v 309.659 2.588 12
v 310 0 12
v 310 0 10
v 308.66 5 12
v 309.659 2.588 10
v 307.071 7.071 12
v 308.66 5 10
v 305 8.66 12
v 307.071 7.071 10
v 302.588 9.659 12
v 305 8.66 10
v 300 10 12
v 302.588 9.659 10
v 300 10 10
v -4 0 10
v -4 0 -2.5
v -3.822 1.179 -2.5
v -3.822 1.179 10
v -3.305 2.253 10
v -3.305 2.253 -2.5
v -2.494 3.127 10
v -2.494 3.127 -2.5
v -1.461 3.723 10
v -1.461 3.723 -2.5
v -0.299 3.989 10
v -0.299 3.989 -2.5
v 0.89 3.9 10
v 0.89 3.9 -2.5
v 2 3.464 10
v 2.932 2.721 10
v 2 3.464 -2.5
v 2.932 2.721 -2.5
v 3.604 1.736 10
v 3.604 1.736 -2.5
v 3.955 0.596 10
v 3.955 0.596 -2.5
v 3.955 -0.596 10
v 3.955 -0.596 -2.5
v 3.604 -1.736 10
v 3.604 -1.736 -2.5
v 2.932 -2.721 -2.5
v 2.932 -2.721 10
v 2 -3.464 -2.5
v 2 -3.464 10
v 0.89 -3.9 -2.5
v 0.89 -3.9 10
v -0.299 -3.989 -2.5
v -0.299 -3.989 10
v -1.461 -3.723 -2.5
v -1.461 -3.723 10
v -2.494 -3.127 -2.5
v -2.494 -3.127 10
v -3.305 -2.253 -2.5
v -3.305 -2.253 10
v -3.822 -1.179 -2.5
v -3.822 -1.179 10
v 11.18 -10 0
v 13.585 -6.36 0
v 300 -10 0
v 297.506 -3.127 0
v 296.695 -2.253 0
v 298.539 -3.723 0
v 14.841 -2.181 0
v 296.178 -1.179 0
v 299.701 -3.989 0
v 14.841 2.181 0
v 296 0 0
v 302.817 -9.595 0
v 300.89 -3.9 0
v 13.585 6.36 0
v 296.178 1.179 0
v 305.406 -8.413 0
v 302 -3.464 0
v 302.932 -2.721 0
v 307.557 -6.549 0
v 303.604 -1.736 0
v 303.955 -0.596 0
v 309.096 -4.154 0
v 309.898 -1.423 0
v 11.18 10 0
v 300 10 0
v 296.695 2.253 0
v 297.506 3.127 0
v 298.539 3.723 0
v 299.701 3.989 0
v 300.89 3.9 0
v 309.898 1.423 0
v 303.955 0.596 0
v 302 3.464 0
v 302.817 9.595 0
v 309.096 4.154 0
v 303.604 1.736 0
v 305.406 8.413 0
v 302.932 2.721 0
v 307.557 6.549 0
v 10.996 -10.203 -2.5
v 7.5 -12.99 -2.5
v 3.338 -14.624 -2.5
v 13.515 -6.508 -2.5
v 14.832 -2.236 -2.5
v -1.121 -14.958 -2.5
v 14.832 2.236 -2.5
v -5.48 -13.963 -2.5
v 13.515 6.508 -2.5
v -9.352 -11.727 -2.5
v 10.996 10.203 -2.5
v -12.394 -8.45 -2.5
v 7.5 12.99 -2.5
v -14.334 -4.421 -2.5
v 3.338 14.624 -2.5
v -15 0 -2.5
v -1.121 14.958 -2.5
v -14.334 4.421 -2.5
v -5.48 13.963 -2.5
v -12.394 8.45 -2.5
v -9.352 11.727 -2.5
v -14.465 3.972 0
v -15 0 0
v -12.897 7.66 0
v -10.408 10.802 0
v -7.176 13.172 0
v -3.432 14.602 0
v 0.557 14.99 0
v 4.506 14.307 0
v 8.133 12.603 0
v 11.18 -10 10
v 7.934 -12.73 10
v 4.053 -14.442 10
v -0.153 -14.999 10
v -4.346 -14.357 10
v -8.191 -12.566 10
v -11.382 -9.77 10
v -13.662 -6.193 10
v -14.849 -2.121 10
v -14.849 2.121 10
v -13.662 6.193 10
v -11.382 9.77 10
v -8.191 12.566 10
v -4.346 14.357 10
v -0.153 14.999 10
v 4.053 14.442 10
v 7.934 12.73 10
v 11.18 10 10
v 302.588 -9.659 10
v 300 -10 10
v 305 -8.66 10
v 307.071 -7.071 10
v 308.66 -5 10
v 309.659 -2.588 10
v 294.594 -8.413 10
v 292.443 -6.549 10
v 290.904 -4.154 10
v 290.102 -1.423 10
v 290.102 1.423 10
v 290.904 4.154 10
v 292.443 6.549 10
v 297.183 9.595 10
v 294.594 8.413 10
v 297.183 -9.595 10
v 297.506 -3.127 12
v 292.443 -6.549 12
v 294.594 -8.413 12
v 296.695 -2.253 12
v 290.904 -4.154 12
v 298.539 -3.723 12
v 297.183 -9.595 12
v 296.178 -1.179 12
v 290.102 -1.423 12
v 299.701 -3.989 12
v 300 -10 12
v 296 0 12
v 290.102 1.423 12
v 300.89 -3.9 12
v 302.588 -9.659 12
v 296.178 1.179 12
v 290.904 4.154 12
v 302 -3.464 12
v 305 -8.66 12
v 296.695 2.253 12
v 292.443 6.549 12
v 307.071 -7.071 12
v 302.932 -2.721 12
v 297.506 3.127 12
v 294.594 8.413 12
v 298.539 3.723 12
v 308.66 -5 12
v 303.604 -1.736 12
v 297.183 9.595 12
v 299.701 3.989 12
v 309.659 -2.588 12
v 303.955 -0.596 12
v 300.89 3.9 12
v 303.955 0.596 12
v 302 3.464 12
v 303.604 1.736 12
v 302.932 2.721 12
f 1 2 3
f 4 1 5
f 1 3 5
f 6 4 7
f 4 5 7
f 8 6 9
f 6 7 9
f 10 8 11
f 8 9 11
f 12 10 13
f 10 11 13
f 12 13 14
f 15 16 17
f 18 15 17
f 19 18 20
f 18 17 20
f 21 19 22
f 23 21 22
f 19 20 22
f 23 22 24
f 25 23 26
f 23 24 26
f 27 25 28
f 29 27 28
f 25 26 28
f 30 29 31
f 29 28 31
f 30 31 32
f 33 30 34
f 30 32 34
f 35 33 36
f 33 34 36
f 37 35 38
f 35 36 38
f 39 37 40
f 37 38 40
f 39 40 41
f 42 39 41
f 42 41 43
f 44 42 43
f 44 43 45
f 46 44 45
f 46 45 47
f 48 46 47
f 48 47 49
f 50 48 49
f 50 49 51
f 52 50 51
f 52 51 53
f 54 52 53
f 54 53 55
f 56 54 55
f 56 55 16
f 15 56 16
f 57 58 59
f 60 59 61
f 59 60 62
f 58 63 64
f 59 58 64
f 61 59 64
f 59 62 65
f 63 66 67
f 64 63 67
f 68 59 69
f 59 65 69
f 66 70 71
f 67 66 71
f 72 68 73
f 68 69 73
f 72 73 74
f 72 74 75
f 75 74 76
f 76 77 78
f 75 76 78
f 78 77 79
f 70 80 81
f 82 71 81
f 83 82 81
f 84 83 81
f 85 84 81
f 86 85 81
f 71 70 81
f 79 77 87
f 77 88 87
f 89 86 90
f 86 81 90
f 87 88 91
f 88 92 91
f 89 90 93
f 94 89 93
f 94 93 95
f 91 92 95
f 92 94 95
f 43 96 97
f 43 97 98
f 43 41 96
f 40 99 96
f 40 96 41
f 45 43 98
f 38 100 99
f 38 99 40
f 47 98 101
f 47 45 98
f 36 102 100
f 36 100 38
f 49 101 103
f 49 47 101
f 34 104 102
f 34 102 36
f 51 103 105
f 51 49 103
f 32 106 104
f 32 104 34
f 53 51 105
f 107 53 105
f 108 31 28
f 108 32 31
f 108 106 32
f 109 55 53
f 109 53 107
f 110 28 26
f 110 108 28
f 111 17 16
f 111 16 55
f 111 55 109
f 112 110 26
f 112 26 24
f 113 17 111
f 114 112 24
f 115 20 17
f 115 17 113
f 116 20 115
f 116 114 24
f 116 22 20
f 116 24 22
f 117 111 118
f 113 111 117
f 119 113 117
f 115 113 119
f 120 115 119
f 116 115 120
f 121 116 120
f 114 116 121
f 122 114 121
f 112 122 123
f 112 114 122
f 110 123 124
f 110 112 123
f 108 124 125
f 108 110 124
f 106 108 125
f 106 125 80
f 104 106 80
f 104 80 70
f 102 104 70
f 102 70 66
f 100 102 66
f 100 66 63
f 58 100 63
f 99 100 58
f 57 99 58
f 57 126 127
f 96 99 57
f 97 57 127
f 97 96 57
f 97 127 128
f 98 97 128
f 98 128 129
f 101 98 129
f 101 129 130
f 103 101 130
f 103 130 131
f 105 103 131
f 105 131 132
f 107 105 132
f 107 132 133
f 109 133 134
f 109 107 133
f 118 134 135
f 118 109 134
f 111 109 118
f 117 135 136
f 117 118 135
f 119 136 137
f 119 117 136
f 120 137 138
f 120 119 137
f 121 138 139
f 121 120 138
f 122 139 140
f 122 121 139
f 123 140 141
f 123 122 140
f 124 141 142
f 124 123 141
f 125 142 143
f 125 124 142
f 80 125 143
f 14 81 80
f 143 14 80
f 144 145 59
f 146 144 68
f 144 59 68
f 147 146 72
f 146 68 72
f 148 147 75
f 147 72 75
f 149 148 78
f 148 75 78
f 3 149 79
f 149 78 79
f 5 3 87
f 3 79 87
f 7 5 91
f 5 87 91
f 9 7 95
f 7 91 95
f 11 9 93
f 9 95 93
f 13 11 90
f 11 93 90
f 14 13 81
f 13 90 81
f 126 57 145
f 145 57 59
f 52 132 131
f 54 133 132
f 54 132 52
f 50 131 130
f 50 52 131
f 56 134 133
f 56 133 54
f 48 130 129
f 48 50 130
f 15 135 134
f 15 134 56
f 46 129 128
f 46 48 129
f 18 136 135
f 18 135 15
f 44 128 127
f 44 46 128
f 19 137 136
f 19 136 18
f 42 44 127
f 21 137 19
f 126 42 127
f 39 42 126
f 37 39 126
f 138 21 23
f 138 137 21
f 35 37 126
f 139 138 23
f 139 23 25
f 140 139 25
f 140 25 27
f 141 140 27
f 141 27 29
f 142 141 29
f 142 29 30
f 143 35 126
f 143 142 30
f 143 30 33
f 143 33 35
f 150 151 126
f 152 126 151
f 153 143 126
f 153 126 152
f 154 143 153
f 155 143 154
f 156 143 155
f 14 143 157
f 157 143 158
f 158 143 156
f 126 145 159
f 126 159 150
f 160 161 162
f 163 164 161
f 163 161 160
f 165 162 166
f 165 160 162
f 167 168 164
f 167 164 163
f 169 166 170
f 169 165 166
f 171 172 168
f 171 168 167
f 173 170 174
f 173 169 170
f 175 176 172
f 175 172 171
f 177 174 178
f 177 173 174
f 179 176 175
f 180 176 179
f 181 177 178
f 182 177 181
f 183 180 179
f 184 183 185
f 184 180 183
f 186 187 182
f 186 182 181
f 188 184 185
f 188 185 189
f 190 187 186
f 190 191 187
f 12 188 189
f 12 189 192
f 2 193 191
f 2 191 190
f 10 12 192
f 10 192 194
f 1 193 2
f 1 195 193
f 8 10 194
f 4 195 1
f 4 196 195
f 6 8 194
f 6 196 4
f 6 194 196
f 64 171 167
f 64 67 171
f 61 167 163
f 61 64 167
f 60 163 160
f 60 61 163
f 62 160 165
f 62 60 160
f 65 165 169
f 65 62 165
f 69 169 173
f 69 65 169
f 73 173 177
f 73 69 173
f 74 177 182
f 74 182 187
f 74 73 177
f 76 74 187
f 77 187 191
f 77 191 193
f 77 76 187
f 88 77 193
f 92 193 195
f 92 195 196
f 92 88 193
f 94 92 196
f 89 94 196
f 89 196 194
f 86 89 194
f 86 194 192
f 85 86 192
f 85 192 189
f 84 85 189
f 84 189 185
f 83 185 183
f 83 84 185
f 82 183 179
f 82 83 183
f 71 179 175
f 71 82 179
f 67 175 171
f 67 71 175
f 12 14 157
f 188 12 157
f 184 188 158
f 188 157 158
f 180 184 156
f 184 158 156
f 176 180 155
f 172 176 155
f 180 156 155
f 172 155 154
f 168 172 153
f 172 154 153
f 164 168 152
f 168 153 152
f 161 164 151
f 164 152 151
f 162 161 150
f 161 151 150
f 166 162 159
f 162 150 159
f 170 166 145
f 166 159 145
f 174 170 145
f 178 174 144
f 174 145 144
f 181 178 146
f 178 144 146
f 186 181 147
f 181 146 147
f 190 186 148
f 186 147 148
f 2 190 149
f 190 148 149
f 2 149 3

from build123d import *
from build123d.topology import SkipClean

# Parameters (mm, degrees)
SKETCH1_R             = 15
BOSS_EXTRUDE1_DEPTH   = 10
SKETCH1_R_2           = 10
BOSS_EXTRUDE1_2_DEPTH = 10
BOSS_EXTRUDE3_DEPTH   = 10
SKETCH13_R            = 4
CUT_EXTRUDE1_DEPTH    = 20
BOSS_EXTRUDE7_START   = 2.5
SKETCH14_R            = 15
SKETCH14_R_2          = 4
BOSS_EXTRUDE7_DEPTH   = 2.5
SKETCH15_R            = 4
BOSS_EXTRUDE8_DEPTH   = 2


with BuildPart() as part:
    # Sketch1 → Boss-Extrude1 (new body)
    with BuildSketch(Plane.XY):
        Circle(SKETCH1_R)
    extrude(amount=BOSS_EXTRUDE1_DEPTH)



with BuildPart() as body_2:
    # Sketch1 → Boss-Extrude1 2 (new body)
    with BuildSketch(Plane.XY):
        with Locations((300, 0)):
            Circle(SKETCH1_R_2)
    extrude(amount=BOSS_EXTRUDE1_2_DEPTH)


with BuildPart() as part_1:
    add(part.part)

    add(body_2.part)  # Boss-Extrude3 merges body 2
    # Sketch5 → Boss-Extrude3 (add)
    with BuildSketch(Plane.XY):
        with BuildLine():
            Line((300, 10), (11.180339887, 10))
            ThreePointArc((11.180339887, 10), (14.012585384, 5.352331347), (15, 0))
            ThreePointArc((15, 0), (14.012585384, -5.352331347), (11.180339887, -10))
            Line((11.180339887, -10), (300, -10))
            ThreePointArc((300, -10), (290, 0), (300, 10))
        make_face()
    extrude(amount=BOSS_EXTRUDE3_DEPTH)

    # Sketch13 → Cut-Extrude1 (cut)
    with BuildSketch(Plane(origin=(0, 0, 0), x_dir=(-1, 0, 0), z_dir=(0, 0, -1))):
        with Locations((-300, 0)):
            Circle(SKETCH13_R)
        Circle(SKETCH13_R)
    extrude(amount=-CUT_EXTRUDE1_DEPTH, mode=Mode.SUBTRACT)

    # Sketch14 → Boss-Extrude7 (add)
    with BuildSketch(Plane(origin=(0, 0, 0), x_dir=(-1, 0, 0), z_dir=(0, 0, -1)).offset(BOSS_EXTRUDE7_START)):
        Circle(SKETCH14_R)
        Circle(SKETCH14_R_2, mode=Mode.SUBTRACT)
    extrude(amount=-BOSS_EXTRUDE7_DEPTH)

    # Sketch15 → Boss-Extrude8 (add)
    with SkipClean():  # the faces are left unmerged after this step: merging them gives an invalid solid
        with BuildSketch(Plane.XY.offset(10)):
            with BuildLine():
                ThreePointArc((300, 10), (290, 0), (300, -10))
                ThreePointArc((300, -10), (307.071067812, -7.071067812), (310, 0))
                ThreePointArc((310, 0), (307.071067812, 7.071067812), (300, 10))
            make_face()
            with Locations((300, 0)):
                Circle(SKETCH15_R, mode=Mode.SUBTRACT)
        extrude(amount=BOSS_EXTRUDE8_DEPTH)


solid = part_1.part
